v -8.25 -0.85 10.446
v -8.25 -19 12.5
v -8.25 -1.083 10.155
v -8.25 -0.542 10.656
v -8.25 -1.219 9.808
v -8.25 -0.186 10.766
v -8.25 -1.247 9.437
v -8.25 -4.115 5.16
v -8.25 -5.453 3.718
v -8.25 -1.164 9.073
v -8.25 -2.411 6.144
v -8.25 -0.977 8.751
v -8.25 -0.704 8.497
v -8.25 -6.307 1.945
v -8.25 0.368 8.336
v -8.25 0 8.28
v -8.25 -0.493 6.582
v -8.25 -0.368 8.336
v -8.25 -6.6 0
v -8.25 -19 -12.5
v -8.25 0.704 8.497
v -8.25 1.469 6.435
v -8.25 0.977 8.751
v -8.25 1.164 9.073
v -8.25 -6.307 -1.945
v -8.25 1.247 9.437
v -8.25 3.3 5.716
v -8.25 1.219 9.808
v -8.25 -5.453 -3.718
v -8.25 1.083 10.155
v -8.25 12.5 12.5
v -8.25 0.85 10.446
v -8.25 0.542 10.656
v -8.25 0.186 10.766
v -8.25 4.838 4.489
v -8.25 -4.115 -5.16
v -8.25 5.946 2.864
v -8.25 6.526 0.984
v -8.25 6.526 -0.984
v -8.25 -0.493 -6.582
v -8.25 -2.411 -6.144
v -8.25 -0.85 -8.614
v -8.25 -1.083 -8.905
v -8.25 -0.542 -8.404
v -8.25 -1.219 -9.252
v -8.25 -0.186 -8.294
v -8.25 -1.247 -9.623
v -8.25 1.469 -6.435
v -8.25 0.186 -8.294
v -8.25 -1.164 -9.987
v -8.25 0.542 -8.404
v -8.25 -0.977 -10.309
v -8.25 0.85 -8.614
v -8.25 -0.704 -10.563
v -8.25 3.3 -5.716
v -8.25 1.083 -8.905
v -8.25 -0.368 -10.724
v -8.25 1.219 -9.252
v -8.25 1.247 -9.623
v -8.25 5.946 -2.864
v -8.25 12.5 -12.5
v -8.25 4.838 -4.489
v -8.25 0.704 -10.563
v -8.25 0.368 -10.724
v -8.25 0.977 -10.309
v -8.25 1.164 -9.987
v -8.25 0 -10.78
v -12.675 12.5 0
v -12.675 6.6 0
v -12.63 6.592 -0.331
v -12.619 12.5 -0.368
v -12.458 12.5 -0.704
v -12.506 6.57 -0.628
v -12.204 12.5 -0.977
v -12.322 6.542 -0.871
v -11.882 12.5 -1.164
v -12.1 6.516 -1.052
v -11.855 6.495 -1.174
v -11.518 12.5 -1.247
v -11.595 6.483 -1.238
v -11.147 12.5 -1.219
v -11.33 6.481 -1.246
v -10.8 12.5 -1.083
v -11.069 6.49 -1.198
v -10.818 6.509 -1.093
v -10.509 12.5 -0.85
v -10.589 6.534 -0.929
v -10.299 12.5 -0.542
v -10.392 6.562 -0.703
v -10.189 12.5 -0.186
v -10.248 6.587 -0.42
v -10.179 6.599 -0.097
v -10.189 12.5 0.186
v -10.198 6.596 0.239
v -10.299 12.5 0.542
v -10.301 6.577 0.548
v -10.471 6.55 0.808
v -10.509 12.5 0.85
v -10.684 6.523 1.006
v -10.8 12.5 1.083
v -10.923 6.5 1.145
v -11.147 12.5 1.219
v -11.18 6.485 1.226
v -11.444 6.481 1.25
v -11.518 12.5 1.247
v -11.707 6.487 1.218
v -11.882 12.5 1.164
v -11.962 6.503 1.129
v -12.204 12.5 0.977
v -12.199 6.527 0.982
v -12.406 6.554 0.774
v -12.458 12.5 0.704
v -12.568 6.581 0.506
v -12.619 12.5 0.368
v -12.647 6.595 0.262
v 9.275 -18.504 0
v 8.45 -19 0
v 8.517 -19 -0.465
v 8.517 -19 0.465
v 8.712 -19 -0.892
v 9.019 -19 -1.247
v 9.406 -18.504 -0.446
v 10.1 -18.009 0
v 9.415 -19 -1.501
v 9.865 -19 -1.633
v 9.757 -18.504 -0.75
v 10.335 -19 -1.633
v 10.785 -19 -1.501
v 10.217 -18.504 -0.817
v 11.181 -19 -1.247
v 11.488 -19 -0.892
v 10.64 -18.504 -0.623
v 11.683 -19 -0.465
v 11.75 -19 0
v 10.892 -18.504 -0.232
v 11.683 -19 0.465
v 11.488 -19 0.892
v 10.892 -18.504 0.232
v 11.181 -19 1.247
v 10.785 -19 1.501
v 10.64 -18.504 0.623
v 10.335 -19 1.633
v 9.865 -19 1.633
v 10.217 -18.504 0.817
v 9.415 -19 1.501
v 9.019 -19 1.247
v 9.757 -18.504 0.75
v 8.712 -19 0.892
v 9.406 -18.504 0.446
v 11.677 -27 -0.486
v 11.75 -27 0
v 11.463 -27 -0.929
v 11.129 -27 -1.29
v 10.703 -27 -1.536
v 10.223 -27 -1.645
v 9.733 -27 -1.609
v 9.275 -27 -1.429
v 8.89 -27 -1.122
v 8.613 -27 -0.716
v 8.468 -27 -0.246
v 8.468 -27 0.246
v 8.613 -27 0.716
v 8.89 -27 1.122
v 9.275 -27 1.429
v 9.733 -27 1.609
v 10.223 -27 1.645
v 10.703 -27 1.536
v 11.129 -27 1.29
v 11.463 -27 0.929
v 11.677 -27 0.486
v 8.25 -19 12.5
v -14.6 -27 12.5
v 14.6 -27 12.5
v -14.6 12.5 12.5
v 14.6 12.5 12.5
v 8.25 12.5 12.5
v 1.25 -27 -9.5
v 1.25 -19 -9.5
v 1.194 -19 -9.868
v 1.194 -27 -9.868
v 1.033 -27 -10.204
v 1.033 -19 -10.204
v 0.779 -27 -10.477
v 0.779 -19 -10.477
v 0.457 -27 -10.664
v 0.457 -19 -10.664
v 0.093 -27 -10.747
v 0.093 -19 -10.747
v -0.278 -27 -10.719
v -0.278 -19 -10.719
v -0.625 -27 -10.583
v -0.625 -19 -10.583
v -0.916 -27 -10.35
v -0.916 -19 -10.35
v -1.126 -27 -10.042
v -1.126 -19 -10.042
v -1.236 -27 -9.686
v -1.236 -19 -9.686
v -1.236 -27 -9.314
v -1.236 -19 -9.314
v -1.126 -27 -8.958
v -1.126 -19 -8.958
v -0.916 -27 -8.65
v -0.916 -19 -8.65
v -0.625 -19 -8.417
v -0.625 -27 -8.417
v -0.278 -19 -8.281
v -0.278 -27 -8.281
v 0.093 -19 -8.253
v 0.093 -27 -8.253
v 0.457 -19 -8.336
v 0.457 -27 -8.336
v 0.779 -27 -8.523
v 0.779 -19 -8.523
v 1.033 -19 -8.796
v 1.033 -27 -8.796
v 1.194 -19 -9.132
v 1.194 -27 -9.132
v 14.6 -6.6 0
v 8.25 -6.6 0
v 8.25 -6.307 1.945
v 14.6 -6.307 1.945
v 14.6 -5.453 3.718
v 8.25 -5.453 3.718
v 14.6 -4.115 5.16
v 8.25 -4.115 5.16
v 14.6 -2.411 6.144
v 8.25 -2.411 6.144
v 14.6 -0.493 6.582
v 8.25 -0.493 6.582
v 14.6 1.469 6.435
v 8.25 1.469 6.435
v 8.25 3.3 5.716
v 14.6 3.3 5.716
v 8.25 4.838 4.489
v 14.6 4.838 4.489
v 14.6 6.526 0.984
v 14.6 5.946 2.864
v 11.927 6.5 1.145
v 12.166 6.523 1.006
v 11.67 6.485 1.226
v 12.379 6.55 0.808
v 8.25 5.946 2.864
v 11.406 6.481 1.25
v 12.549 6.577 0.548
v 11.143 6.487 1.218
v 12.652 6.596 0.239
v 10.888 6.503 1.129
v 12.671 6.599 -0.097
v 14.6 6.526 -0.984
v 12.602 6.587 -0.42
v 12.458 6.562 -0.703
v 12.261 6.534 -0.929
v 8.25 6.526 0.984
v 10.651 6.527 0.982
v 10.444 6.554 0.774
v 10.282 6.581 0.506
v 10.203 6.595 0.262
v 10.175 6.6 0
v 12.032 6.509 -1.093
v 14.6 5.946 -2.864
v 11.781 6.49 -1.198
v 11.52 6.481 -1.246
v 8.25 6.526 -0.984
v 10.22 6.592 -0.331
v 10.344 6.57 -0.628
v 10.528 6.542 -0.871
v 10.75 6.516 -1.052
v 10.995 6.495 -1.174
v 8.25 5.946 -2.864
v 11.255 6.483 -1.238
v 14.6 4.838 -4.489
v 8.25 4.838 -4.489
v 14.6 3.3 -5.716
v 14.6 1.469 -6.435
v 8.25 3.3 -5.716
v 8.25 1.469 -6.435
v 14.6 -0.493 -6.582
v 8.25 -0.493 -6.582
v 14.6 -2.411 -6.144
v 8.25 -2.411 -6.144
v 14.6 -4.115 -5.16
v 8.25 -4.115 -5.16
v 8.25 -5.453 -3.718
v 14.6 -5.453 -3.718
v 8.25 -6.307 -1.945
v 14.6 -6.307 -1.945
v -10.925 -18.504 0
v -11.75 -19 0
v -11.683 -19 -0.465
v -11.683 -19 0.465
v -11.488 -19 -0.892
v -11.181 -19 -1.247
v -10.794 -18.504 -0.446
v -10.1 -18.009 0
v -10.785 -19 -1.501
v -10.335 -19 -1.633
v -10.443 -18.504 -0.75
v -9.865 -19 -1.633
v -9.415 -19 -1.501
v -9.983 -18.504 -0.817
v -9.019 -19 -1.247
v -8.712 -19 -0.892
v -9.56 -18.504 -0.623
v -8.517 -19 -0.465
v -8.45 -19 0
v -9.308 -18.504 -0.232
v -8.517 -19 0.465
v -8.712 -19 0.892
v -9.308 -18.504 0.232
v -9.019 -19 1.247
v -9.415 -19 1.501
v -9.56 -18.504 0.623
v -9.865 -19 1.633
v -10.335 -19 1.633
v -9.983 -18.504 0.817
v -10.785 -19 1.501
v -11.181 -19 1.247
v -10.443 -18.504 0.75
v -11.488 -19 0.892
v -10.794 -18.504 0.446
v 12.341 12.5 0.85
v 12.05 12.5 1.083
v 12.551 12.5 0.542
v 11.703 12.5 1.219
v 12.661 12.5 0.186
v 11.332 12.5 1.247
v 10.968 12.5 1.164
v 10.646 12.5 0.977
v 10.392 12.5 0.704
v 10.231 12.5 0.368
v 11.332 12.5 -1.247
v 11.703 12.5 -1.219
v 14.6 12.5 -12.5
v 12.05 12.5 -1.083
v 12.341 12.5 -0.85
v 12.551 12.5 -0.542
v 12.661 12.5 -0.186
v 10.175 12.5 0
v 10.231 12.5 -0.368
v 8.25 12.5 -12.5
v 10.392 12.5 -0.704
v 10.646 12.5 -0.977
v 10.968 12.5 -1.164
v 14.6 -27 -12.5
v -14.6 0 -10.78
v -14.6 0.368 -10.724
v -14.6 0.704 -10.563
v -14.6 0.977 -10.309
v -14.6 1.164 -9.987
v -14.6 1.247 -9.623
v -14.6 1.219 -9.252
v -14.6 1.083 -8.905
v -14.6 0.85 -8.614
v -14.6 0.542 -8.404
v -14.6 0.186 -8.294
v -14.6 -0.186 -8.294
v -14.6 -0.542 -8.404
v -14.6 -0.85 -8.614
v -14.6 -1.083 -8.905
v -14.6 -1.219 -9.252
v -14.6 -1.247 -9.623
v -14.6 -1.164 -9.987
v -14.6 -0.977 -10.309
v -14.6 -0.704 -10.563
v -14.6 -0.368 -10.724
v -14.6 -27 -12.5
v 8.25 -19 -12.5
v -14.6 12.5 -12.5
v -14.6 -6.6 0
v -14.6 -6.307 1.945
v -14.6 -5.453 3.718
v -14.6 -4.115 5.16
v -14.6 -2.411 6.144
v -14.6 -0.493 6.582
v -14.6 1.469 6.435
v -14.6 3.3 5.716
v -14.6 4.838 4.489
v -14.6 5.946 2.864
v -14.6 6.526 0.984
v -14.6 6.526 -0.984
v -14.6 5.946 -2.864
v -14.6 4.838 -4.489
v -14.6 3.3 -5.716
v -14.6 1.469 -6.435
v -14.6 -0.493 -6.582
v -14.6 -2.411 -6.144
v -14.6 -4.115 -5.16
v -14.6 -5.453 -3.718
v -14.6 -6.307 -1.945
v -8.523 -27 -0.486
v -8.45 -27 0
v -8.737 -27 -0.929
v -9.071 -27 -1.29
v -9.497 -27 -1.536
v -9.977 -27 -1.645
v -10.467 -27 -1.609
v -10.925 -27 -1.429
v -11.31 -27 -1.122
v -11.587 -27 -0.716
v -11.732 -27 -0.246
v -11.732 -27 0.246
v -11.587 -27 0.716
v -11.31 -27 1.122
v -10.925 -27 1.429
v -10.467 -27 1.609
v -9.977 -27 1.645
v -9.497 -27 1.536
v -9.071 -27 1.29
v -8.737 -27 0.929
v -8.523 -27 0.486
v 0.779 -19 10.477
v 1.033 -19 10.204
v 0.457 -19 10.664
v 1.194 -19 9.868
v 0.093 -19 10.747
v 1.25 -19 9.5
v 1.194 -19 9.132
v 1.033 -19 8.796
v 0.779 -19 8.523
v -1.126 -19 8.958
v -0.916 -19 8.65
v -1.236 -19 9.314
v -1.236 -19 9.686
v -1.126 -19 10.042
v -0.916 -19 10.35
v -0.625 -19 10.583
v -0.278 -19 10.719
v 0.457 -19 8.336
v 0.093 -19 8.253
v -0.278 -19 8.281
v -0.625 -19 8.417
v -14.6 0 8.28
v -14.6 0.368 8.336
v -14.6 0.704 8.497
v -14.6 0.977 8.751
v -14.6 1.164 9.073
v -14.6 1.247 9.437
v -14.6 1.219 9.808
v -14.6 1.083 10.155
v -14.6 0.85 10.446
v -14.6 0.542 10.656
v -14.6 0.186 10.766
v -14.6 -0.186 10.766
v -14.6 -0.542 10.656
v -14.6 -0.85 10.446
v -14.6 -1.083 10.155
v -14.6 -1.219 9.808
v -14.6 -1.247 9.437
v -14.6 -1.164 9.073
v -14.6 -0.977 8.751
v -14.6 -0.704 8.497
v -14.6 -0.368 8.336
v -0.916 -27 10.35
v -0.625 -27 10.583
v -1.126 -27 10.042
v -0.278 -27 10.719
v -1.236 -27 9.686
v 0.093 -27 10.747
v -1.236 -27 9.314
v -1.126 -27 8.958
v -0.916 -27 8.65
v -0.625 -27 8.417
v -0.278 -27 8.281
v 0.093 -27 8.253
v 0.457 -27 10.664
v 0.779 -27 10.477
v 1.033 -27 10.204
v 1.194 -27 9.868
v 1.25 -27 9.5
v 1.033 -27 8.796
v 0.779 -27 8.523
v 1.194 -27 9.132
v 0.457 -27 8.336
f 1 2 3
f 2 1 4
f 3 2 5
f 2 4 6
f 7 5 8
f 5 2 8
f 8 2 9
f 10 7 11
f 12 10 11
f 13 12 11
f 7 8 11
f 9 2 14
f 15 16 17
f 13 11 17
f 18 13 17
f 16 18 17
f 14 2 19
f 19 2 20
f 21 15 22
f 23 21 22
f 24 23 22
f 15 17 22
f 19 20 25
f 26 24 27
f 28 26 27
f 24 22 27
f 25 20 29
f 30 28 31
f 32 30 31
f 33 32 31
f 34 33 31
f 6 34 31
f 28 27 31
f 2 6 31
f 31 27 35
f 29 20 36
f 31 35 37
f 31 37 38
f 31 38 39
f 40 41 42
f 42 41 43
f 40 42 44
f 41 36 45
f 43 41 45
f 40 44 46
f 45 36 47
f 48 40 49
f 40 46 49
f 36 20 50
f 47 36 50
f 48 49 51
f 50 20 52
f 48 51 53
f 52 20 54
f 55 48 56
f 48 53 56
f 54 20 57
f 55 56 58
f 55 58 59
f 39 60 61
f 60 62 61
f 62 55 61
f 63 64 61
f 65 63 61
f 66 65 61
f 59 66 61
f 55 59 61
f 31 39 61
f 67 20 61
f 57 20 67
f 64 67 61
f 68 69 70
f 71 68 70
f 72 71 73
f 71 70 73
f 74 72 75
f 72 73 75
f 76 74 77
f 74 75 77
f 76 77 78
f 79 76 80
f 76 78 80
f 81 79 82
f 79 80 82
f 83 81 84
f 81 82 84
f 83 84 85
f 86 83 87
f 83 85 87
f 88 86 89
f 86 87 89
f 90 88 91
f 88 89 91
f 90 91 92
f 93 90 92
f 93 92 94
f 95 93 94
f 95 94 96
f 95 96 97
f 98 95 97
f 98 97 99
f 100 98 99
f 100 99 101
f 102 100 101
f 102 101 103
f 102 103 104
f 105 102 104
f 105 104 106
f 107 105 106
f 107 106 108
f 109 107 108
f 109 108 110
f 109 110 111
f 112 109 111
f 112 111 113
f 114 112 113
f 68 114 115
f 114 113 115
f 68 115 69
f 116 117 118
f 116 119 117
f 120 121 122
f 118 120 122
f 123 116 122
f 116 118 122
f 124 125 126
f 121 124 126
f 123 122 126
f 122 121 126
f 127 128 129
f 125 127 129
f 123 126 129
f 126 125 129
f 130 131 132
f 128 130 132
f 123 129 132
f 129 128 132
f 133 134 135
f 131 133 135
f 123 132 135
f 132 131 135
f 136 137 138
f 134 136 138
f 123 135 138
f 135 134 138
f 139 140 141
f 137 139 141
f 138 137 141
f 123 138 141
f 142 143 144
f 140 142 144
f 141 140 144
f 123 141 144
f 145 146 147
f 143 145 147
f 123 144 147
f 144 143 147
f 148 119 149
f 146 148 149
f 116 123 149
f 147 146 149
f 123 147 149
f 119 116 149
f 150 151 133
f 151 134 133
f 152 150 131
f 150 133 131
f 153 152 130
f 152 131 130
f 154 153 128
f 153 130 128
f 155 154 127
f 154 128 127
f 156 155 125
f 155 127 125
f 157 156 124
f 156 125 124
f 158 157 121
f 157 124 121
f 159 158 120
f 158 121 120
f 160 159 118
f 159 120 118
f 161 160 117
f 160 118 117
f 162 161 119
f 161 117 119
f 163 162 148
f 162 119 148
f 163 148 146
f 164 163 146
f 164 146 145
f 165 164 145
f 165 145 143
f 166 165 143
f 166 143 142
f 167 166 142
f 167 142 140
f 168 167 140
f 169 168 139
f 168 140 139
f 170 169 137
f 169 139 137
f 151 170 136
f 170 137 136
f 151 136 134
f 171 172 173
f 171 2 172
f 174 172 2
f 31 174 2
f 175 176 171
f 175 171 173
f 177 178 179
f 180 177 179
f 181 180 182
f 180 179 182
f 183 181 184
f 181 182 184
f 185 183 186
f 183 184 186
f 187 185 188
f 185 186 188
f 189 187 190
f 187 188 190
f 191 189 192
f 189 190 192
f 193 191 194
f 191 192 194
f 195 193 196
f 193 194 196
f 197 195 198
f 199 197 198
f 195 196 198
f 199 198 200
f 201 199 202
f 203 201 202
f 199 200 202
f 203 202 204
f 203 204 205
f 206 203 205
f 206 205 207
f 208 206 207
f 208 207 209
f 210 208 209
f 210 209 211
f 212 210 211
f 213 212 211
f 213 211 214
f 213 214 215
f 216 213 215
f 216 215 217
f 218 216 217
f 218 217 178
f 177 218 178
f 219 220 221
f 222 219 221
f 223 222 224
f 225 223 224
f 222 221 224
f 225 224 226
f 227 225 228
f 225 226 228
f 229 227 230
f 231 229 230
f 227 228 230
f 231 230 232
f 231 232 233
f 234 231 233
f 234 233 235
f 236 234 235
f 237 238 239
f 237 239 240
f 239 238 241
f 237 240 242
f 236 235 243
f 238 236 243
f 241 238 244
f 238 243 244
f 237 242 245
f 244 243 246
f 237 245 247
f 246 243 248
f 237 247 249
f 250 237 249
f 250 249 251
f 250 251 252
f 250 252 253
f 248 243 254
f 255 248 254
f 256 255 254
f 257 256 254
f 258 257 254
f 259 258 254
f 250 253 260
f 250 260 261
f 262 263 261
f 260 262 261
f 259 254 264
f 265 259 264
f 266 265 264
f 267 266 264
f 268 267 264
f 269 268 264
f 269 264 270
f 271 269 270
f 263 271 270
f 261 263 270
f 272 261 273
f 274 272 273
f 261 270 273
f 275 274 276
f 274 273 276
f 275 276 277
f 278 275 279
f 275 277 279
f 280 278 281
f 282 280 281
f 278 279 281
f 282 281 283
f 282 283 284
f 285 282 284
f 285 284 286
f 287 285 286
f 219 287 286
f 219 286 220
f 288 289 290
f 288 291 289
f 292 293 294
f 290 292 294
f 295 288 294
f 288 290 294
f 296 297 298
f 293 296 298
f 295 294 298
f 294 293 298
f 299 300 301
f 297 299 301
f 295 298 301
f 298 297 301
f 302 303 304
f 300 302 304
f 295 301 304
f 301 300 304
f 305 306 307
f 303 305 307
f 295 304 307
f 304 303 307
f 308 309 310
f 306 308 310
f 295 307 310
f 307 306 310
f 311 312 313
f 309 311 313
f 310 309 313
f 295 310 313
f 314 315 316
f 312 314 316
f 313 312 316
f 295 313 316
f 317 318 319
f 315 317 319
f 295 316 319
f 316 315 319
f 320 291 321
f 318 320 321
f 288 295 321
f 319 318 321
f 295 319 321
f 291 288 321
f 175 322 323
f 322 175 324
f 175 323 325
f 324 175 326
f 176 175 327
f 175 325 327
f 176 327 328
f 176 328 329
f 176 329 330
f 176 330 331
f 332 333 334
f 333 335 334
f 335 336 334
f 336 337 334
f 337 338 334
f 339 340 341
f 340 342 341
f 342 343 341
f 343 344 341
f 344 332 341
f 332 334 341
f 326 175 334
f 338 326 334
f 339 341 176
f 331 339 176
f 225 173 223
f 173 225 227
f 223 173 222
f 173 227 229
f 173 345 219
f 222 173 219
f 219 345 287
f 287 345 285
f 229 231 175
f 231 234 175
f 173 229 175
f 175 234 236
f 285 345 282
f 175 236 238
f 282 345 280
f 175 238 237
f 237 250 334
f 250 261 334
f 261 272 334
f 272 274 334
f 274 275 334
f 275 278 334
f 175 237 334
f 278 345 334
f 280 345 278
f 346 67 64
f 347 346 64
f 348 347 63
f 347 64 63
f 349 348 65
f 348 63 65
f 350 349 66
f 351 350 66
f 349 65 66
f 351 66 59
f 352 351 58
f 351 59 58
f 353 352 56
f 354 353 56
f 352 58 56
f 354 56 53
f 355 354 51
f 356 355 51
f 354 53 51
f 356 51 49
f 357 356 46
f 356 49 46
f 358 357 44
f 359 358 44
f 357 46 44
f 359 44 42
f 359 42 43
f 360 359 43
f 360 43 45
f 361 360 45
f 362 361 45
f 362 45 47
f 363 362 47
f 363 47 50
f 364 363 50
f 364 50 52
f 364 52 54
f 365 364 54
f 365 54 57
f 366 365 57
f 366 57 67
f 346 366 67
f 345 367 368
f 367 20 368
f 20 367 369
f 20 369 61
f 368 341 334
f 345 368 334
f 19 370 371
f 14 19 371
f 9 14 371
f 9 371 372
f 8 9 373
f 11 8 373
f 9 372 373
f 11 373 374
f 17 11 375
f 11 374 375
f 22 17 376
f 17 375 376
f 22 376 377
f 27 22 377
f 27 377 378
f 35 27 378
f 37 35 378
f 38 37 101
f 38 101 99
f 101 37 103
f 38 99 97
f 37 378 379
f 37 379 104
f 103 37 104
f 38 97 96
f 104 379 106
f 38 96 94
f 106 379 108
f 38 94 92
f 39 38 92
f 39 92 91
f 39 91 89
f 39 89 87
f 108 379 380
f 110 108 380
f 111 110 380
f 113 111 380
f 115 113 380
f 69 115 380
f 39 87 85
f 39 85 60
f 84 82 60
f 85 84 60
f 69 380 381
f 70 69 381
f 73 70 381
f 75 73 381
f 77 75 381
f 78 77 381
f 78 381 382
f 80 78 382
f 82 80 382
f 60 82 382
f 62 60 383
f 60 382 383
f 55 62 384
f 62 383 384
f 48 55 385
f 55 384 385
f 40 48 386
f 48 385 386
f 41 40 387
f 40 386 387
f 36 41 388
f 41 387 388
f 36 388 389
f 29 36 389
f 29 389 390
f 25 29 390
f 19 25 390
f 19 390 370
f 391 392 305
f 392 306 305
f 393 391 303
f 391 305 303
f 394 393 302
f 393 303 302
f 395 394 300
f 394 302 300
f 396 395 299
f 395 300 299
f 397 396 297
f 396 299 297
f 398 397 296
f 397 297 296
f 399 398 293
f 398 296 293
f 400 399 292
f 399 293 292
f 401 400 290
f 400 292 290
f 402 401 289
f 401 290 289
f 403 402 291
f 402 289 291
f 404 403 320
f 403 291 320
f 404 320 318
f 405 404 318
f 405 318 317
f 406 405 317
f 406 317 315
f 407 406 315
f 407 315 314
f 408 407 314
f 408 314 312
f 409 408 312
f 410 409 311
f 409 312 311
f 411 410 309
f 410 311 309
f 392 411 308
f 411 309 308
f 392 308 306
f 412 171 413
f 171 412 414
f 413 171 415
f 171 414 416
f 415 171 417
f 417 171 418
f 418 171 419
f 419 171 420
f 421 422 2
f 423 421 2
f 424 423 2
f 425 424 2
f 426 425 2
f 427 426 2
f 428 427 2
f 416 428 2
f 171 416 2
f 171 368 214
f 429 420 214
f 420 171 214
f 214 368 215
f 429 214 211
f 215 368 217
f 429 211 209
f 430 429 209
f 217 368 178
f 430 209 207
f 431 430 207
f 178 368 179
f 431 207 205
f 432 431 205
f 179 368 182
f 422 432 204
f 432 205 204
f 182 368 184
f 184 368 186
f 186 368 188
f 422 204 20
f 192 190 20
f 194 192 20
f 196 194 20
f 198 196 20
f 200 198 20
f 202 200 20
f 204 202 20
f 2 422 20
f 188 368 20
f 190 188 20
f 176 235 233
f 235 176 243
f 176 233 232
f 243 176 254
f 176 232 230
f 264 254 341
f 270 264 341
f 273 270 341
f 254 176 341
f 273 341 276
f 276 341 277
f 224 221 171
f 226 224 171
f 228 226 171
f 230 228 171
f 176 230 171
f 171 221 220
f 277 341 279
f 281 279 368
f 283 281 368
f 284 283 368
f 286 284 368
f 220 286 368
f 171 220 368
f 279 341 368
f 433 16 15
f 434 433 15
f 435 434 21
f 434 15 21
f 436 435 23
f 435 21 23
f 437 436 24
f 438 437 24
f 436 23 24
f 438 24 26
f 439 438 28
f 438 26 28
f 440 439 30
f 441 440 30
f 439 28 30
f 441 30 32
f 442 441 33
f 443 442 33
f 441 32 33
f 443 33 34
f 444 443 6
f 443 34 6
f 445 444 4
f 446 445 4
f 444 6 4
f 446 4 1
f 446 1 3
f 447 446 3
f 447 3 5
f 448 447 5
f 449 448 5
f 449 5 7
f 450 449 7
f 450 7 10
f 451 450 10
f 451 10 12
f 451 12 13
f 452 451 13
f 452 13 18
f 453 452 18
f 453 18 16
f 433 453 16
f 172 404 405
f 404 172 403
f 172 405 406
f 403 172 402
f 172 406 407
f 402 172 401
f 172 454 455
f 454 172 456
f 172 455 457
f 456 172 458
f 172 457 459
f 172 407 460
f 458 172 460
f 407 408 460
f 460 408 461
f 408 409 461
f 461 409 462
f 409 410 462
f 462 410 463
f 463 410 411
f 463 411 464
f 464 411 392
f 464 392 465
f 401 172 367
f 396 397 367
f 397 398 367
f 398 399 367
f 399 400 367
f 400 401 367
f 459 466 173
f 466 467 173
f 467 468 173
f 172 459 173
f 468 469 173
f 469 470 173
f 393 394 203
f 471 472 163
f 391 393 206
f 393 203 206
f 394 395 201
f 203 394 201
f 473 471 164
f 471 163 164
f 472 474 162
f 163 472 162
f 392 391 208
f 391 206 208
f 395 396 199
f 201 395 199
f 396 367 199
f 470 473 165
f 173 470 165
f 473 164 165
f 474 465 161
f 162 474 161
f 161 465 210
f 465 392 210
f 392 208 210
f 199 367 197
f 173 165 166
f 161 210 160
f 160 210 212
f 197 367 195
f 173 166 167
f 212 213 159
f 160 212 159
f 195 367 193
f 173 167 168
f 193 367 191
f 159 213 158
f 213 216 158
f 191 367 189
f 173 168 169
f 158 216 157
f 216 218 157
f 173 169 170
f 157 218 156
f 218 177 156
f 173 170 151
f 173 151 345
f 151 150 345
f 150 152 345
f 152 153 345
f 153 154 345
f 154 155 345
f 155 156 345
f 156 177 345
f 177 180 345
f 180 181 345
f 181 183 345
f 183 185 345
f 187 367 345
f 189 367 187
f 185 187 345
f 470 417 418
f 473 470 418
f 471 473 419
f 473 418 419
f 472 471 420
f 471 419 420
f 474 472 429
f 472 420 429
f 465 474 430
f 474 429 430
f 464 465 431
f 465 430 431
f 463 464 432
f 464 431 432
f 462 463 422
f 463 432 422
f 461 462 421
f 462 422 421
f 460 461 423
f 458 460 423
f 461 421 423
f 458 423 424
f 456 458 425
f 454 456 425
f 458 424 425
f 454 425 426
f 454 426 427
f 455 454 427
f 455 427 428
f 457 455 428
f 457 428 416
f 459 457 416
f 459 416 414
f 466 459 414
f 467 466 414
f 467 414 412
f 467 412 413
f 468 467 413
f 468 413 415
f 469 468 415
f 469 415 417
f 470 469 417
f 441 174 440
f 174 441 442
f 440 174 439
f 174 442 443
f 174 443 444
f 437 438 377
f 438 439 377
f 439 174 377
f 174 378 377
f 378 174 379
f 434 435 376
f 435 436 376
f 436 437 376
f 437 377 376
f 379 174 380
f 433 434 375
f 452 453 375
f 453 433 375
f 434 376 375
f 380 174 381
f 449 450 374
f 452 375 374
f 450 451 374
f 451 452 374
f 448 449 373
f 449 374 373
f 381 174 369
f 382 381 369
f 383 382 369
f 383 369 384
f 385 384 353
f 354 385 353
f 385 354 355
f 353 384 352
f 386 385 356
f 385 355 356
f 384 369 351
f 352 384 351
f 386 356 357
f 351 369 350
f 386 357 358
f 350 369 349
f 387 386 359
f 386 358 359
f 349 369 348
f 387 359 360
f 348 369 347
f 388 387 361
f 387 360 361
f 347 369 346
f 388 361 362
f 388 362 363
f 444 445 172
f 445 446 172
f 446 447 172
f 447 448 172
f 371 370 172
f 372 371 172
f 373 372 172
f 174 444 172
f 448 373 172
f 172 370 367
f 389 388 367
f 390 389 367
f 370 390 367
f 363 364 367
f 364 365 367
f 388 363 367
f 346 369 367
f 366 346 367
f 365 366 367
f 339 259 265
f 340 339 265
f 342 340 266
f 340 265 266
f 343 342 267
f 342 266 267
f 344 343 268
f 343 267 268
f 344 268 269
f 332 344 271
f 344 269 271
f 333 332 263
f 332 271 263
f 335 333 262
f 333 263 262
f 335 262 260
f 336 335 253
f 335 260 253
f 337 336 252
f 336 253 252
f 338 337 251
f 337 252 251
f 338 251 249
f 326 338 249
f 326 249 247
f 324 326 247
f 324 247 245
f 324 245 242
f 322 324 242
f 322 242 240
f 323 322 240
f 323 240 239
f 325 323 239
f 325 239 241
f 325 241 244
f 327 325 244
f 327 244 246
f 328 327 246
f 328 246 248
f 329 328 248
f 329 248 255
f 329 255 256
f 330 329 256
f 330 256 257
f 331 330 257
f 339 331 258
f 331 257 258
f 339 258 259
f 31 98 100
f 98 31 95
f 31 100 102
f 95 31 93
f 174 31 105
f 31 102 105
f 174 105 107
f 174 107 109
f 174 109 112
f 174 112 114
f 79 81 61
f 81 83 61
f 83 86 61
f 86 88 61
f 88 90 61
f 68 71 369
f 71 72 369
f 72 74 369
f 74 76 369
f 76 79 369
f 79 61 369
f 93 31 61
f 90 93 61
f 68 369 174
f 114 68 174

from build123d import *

# Parameters (mm, degrees)
BOSS_EXTRUDE1_DEPTH             = 12.5
BOSS_EXTRUDE1_DEPTH_BACK        = 12.5
SKETCH3_R                       = 6.6
CUT_EXTRUDE1_DEPTH              = 42.688007868
TAP_DRILL_FOR_M3X0_5_TAP3_D     = 2.5
TAP_DRILL_FOR_M3X0_5_TAP3_DEPTH = 7
TAP_DRILL_FOR_M3X0_5_TAP3_TIP   = 0.751075774
TAP_DRILL_FOR_M4X0_7_TAP1_D     = 3.3
TAP_DRILL_FOR_M4X0_7_TAP1_DEPTH = 8
TAP_DRILL_FOR_M4X0_7_TAP1_TIP   = 0.991420021
TAP_DRILL_FOR_M3X0_5_TAP4_D     = 2.5
TAP_DRILL_FOR_M3X0_5_TAP4_DEPTH = 6.35
TAP_DRILL_FOR_M3X0_5_TAP5_D     = 2.5


with BuildPart() as part:
    # Sketch1 → Boss-Extrude1 (new, two sides: drawn at the far end of the back side and taken through both)
    with BuildSketch(Plane.XY.offset(-BOSS_EXTRUDE1_DEPTH_BACK)):
        Polygon((-14.6, 12.5), (-14.6, -27), (14.6, -27), (14.6, 12.5), (8.25, 12.5), (8.25, -19), (-8.25, -19), (-8.25, 12.5), align=None)
    extrude(amount=BOSS_EXTRUDE1_DEPTH + BOSS_EXTRUDE1_DEPTH_BACK)

    # Sketch3 → Cut-Extrude1 (cut, through all)
    with BuildSketch(Plane.ZY.offset(14.6)):
        with Locations(Location((0, 0, 0), (0, 0, 270))):
            Circle(SKETCH3_R)
    extrude(amount=-CUT_EXTRUDE1_DEPTH, mode=Mode.SUBTRACT)

    # Tap Drill for M3x0.5 Tap3
    with Locations(Plane(origin=(0, 12.5, 0), x_dir=(1, 0, 0), z_dir=(0, 1, 0))):
        with Locations((-11.425, 0), (11.425, 0)):
            Hole(TAP_DRILL_FOR_M3X0_5_TAP3_D / 2, depth=TAP_DRILL_FOR_M3X0_5_TAP3_DEPTH)
            with Locations((0, 0, -(TAP_DRILL_FOR_M3X0_5_TAP3_DEPTH + TAP_DRILL_FOR_M3X0_5_TAP3_TIP / 2))):  # 118° drill point
                Cone(0, TAP_DRILL_FOR_M3X0_5_TAP3_D / 2, TAP_DRILL_FOR_M3X0_5_TAP3_TIP, mode=Mode.SUBTRACT)

    # Tap Drill for M4x0.7 Tap1
    with Locations(Plane(origin=(0, -27, 0), x_dir=(-1, 0, 0), z_dir=(0, -1, 0))):
        with Locations((-10.1, 0), (10.1, 0)):
            Hole(TAP_DRILL_FOR_M4X0_7_TAP1_D / 2, depth=TAP_DRILL_FOR_M4X0_7_TAP1_DEPTH)
            with Locations((0, 0, -(TAP_DRILL_FOR_M4X0_7_TAP1_DEPTH + TAP_DRILL_FOR_M4X0_7_TAP1_TIP / 2))):  # 118° drill point
                Cone(0, TAP_DRILL_FOR_M4X0_7_TAP1_D / 2, TAP_DRILL_FOR_M4X0_7_TAP1_TIP, mode=Mode.SUBTRACT)

    # Tap Drill for M3x0.5 Tap4
    with Locations(Plane.ZY.offset(14.6)):
        with Locations((-9.53, 0), (9.53, 0)):
            Hole(TAP_DRILL_FOR_M3X0_5_TAP4_D / 2, depth=TAP_DRILL_FOR_M3X0_5_TAP4_DEPTH)

    # Tap Drill for M3x0.5 Tap5 (through all)
    with Locations(Plane(origin=(0, -27, 0), x_dir=(-1, 0, 0), z_dir=(0, -1, 0))):
        with Locations((0, -9.5), (0, 9.5)):
            Hole(TAP_DRILL_FOR_M3X0_5_TAP5_D / 2)


solid = part.part
